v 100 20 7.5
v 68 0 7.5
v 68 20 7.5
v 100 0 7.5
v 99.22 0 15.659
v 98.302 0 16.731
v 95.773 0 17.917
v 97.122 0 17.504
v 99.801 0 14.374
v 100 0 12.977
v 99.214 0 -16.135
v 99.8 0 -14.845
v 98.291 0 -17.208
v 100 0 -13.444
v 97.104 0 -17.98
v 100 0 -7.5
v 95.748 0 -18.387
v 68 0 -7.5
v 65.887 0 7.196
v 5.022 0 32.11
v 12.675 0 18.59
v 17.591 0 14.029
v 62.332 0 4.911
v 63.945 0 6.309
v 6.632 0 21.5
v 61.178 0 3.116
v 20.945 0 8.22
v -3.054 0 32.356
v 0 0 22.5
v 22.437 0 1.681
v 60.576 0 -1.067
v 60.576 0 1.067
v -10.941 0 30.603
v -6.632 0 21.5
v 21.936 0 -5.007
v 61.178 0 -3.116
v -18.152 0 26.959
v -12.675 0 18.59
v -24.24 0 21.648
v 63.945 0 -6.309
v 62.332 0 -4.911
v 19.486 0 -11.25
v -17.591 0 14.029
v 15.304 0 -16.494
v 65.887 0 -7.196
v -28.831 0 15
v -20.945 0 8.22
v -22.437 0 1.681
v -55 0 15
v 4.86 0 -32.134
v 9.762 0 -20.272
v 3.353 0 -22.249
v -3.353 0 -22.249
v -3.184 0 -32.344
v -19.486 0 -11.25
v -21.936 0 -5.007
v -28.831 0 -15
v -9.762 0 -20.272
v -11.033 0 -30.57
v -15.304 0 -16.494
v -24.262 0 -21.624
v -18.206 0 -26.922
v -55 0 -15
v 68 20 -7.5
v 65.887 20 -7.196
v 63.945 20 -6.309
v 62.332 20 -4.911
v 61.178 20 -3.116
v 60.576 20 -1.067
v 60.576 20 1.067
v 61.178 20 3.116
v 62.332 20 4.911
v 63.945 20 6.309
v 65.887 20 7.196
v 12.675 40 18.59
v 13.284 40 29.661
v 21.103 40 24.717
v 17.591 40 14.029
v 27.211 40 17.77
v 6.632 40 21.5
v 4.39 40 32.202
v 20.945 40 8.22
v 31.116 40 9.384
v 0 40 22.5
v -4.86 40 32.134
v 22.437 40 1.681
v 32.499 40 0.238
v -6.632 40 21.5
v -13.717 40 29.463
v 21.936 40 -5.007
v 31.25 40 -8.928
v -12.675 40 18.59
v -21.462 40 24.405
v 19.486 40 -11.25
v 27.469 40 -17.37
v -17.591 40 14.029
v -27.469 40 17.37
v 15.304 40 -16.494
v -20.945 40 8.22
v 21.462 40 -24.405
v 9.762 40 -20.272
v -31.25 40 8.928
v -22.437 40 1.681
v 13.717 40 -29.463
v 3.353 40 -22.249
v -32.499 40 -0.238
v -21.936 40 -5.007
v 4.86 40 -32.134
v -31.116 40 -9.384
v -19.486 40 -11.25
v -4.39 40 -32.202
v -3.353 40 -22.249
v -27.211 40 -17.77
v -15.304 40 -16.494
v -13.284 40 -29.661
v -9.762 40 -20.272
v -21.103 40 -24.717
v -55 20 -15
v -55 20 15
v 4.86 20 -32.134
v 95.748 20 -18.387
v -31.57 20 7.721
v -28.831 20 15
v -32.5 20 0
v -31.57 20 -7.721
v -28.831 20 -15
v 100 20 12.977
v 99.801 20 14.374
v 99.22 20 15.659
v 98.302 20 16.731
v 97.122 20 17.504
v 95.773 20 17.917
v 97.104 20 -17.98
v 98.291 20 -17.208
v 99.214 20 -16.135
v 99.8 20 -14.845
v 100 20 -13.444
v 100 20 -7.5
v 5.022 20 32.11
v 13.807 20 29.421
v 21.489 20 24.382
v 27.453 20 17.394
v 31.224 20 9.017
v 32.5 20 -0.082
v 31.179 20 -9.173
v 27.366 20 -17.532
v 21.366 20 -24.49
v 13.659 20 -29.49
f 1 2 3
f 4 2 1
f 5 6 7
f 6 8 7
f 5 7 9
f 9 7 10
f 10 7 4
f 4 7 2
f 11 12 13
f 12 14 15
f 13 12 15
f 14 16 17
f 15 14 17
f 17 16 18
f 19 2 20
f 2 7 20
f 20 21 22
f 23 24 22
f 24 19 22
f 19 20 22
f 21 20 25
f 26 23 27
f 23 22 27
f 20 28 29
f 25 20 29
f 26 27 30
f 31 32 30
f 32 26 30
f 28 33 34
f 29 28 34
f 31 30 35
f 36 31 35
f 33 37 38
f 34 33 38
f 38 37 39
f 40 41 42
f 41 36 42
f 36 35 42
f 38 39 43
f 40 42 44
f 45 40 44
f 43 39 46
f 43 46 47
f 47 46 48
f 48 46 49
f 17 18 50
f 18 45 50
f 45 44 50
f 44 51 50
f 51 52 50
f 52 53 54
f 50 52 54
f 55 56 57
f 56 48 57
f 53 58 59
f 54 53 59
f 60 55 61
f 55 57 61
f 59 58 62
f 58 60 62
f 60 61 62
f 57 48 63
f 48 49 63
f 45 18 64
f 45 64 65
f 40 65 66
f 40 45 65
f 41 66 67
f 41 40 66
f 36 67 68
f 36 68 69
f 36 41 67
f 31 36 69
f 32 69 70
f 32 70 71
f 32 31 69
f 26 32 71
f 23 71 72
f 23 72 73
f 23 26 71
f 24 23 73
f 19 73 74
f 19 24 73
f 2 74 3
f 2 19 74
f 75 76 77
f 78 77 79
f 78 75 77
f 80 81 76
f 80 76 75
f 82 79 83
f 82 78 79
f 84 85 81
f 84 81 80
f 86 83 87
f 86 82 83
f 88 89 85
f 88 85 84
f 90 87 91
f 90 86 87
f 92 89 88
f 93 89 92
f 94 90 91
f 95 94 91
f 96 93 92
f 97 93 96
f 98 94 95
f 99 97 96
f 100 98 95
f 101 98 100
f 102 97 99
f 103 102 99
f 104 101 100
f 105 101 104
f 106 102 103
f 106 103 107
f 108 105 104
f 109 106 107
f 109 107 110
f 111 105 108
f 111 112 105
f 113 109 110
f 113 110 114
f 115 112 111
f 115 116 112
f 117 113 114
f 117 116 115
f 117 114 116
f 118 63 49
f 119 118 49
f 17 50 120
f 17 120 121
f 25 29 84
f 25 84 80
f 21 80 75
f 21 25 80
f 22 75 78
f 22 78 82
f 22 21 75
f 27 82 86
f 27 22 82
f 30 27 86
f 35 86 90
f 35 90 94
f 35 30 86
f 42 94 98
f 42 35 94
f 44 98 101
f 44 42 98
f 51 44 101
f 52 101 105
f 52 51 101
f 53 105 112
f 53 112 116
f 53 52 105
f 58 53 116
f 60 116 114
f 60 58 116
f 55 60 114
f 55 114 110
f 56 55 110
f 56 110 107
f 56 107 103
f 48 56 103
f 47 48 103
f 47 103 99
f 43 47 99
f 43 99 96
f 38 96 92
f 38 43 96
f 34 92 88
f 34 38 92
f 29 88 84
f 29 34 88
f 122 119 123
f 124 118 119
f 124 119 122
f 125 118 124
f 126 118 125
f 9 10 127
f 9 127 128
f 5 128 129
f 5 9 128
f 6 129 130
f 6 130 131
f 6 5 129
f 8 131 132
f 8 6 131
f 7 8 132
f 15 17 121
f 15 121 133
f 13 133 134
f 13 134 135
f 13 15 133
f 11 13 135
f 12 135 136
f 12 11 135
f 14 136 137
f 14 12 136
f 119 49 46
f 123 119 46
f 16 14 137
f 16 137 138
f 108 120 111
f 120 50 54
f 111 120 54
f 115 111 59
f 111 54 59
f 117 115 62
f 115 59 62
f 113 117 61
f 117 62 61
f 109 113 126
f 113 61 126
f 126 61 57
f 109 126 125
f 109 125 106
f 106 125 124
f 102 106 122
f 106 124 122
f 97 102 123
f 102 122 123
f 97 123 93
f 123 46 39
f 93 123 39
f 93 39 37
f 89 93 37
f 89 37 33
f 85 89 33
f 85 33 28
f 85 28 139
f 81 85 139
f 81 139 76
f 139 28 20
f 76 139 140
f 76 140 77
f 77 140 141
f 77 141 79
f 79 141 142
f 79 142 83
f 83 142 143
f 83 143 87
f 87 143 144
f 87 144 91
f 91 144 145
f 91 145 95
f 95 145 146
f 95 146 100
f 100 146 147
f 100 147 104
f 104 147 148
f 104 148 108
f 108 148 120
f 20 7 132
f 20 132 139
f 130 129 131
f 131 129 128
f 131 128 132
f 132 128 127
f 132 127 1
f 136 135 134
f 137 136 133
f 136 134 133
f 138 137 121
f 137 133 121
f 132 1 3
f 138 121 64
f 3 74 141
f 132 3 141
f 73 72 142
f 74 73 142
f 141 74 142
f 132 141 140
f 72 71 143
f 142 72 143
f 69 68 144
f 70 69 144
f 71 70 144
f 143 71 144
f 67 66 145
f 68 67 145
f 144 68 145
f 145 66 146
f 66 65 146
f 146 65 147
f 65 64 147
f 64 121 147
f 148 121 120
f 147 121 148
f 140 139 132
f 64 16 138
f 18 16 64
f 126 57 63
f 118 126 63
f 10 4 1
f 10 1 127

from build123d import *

# Parameters (mm, degrees)
DODANIE_WYCI_GNI_CIE1_DEPTH = 20
SZKIC1_R                    = 32.5
SZKIC1_R_2                  = 22.5
DODANIE_WYCI_GNI_CIE2_DEPTH = 40
DODANIE_WYCI_GNI_CIE3_DEPTH = 20


with BuildPart() as part:
    # Szkic3 → Dodanie-wyciągnięcie1 (new body)
    with BuildSketch(Plane(origin=(0, 0, 0), x_dir=(1, 0, 0), z_dir=(0, 1, 0))):
        with BuildLine():
            Line((4.860466255, 32.134496539), (95.747764039, 18.387443016))
            ThreePointArc((95.747764039, 18.387443016), (98.790700476, 16.704132859), (100, 13.443674318))
            Line((100, 13.443674318), (100, 7.5))
            Line((100, 7.5), (68, 7.5))
            ThreePointArc((68, 7.5), (60.5, 0), (68, -7.5))
            Line((68, -7.5), (100, -7.5))
            Line((100, -7.5), (100, -12.976912833))
            ThreePointArc((100, -12.976912833), (98.79887335, -16.227845203), (95.772575492, -17.91686497))
            Line((95.772575492, -17.91686497), (5.021740697, -32.109688886))
            ThreePointArc((5.021740697, -32.109688886), (32.499897597, 0.081585638), (4.860466255, 32.134496539))
        make_face()
    extrude(amount=DODANIE_WYCI_GNI_CIE1_DEPTH)

    # Szkic1 → Dodanie-wyciągnięcie2 (add)
    with BuildSketch(Plane(origin=(0, 0, 0), x_dir=(1, 0, 0), z_dir=(0, 1, 0))):
        with Locations(Location((0, 0, 0), (0, 0, 81.398987984))):
            Circle(SZKIC1_R)
        with Locations(Location((0, 0, 0), (0, 0, 270))):
            Circle(SZKIC1_R_2, mode=Mode.SUBTRACT)
    extrude(amount=DODANIE_WYCI_GNI_CIE2_DEPTH)

    # Szkic2 → Dodanie-wyciągnięcie3 (add)
    with BuildSketch(Plane(origin=(0, 0, 0), x_dir=(1, 0, 0), z_dir=(0, 1, 0))):
        with BuildLine():
            Line((-28.831406487, 15), (-55, 15))
            Line((-55, 15), (-55, -15))
            Line((-55, -15), (-28.831406487, -15))
            ThreePointArc((-28.831406487, -15), (-32.5, 0), (-28.831406487, 15))
        make_face()
    extrude(amount=DODANIE_WYCI_GNI_CIE3_DEPTH)


solid = part.part
